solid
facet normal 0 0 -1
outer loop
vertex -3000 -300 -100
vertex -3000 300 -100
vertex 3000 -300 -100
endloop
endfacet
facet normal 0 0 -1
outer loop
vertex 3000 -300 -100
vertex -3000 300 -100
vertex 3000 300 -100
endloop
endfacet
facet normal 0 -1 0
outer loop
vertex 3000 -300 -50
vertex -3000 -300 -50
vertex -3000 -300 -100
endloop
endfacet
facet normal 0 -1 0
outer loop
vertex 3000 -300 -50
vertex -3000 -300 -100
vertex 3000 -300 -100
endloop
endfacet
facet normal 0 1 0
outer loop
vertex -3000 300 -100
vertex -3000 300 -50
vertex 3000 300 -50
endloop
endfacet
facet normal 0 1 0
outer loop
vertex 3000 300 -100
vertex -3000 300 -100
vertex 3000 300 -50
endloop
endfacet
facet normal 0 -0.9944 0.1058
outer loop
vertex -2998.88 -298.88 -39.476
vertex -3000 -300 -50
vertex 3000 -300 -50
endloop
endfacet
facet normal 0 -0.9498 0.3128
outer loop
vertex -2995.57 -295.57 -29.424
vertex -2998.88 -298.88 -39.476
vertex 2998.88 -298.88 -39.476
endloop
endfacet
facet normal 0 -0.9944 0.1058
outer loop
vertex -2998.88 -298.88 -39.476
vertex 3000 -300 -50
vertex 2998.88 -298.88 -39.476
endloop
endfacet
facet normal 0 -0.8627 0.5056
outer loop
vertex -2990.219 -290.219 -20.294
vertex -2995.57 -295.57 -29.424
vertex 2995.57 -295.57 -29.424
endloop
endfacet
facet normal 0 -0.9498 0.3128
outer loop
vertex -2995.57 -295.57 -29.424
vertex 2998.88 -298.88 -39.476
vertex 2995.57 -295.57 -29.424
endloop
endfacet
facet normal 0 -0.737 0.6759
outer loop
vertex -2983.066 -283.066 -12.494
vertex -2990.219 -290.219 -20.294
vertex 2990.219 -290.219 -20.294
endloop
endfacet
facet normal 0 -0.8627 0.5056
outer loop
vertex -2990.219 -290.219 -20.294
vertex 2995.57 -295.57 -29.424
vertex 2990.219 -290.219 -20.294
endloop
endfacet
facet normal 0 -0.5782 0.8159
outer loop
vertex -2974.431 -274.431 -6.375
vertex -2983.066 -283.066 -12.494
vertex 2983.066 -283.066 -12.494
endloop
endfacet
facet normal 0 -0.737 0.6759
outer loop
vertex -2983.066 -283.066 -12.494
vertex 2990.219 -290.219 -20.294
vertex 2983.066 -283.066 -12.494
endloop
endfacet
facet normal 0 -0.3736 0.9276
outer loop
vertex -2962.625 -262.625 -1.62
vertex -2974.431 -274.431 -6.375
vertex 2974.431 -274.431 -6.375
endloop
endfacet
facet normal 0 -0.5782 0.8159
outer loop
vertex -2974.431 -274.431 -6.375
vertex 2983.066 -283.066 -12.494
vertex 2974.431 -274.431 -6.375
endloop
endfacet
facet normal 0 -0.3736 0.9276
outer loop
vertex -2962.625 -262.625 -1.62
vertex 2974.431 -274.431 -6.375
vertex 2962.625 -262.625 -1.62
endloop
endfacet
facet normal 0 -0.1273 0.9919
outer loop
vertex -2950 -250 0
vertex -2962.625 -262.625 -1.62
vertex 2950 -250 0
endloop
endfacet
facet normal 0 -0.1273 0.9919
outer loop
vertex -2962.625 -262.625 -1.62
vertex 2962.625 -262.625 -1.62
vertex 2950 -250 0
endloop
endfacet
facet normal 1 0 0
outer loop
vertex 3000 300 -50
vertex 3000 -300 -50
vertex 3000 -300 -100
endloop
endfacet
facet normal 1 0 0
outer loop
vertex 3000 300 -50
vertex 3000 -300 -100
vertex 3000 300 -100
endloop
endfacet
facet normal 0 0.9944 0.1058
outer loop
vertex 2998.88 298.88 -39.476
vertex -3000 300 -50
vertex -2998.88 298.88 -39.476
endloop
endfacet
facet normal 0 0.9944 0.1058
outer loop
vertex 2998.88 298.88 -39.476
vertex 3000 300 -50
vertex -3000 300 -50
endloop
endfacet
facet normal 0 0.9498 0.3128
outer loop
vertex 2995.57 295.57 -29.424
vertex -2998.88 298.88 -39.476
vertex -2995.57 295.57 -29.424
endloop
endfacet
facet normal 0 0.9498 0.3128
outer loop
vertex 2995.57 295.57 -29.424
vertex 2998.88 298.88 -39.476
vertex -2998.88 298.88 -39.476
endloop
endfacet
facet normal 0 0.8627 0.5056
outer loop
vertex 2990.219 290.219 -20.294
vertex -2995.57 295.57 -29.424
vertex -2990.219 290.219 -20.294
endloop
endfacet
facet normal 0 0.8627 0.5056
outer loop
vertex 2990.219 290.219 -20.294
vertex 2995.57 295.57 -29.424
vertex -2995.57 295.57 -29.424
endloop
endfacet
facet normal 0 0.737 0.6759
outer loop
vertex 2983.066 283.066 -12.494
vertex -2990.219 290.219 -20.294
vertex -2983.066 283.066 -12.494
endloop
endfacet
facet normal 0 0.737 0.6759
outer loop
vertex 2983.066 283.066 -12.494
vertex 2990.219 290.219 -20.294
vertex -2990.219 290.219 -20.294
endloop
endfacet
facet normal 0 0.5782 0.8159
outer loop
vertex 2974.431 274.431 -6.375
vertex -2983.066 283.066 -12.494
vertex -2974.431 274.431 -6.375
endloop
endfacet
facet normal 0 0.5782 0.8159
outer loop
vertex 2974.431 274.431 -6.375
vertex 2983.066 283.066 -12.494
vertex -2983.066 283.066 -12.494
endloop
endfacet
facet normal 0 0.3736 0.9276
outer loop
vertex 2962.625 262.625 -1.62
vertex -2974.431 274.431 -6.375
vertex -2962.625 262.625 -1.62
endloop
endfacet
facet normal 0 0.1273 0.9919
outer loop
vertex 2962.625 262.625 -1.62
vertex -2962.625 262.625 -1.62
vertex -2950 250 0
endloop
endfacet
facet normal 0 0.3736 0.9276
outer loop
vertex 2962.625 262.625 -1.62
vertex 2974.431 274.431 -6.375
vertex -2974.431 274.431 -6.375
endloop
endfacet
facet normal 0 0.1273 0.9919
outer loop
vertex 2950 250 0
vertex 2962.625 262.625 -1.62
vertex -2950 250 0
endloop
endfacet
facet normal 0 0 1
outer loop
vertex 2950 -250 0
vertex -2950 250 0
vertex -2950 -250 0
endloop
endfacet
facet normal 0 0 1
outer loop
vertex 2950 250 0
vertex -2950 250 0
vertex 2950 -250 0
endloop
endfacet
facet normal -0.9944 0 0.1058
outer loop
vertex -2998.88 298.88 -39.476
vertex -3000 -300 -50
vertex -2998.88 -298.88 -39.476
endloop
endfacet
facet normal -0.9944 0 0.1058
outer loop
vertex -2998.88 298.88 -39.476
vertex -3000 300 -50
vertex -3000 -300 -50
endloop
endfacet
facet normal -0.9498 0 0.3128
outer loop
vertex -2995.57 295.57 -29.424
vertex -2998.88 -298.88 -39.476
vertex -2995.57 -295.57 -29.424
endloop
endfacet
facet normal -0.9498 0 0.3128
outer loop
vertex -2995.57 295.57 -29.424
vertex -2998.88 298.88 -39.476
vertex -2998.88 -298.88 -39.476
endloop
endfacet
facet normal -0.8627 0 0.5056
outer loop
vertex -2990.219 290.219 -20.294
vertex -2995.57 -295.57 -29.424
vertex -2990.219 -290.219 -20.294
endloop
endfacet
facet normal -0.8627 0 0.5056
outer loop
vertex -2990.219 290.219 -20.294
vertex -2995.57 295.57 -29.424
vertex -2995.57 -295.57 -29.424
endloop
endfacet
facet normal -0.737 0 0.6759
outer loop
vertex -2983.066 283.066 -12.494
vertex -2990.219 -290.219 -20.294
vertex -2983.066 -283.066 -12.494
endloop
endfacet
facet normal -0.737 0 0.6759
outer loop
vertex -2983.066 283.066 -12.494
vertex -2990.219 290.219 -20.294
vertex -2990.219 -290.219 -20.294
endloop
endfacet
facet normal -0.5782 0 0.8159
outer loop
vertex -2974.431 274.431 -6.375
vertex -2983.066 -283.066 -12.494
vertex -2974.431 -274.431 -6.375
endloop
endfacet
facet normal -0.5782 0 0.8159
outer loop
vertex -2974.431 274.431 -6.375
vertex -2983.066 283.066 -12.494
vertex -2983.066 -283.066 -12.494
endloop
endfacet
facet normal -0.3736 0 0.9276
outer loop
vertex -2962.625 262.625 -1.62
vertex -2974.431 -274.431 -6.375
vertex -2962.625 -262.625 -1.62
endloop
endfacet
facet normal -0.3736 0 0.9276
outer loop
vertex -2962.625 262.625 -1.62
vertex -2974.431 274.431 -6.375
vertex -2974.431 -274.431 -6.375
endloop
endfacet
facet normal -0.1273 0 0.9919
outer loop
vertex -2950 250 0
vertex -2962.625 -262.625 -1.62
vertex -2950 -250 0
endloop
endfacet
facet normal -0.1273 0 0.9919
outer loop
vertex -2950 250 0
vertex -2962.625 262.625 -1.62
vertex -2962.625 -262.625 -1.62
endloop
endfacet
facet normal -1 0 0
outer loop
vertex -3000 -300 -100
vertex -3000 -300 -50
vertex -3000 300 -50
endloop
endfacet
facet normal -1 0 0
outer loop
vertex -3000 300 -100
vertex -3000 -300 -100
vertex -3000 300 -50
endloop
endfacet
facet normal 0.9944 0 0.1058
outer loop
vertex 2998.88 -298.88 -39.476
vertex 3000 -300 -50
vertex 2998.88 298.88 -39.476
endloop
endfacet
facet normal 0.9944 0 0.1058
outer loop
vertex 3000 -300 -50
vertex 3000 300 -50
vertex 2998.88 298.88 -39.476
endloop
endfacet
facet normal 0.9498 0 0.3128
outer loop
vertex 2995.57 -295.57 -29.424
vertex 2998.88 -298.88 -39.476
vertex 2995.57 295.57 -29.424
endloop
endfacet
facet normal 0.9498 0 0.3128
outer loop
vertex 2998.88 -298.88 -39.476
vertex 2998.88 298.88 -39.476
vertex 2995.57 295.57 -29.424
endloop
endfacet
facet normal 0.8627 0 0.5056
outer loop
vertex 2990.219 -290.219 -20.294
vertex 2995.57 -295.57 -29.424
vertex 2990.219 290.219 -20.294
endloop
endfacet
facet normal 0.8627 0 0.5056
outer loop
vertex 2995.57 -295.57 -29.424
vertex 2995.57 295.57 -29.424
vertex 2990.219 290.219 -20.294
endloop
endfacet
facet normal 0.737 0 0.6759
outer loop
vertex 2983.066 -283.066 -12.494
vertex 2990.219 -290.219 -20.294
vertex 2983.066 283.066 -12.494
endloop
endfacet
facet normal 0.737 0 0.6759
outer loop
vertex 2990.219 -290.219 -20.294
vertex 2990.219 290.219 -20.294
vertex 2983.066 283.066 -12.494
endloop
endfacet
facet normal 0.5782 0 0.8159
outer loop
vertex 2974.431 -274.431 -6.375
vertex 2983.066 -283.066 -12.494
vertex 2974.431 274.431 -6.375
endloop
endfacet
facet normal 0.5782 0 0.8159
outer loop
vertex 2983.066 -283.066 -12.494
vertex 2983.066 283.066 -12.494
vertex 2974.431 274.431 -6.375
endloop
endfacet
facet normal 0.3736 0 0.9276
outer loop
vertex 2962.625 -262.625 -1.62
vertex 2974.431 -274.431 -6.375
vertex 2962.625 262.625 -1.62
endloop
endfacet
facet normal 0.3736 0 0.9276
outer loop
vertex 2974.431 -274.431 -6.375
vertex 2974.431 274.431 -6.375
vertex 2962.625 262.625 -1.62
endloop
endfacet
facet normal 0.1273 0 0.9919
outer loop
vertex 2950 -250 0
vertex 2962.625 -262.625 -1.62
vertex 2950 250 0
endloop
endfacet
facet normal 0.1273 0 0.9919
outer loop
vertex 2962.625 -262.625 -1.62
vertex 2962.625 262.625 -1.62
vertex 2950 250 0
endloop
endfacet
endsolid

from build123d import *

# Parameters (mm, degrees)
SKETCH1_W           = 6000
SKETCH1_H           = 600
BOSS_EXTRUDE1_DEPTH = 100
FILLET1_R           = 50


with BuildPart() as part:
    # Sketch1 → Boss-Extrude1 (new body)
    with BuildSketch(Plane.XY):
        Rectangle(SKETCH1_W, SKETCH1_H)
    extrude(amount=-BOSS_EXTRUDE1_DEPTH)

    # Fillet1
    fillet1_edges = [part.edges().sort_by_distance(p)[0] for p in [
        (0, -300, 0),
        (-3000, 0, 0),
        (0, 300, 0),
        (3000, 0, 0),
    ]]
    fillet(fillet1_edges, radius=FILLET1_R)


solid = part.part
